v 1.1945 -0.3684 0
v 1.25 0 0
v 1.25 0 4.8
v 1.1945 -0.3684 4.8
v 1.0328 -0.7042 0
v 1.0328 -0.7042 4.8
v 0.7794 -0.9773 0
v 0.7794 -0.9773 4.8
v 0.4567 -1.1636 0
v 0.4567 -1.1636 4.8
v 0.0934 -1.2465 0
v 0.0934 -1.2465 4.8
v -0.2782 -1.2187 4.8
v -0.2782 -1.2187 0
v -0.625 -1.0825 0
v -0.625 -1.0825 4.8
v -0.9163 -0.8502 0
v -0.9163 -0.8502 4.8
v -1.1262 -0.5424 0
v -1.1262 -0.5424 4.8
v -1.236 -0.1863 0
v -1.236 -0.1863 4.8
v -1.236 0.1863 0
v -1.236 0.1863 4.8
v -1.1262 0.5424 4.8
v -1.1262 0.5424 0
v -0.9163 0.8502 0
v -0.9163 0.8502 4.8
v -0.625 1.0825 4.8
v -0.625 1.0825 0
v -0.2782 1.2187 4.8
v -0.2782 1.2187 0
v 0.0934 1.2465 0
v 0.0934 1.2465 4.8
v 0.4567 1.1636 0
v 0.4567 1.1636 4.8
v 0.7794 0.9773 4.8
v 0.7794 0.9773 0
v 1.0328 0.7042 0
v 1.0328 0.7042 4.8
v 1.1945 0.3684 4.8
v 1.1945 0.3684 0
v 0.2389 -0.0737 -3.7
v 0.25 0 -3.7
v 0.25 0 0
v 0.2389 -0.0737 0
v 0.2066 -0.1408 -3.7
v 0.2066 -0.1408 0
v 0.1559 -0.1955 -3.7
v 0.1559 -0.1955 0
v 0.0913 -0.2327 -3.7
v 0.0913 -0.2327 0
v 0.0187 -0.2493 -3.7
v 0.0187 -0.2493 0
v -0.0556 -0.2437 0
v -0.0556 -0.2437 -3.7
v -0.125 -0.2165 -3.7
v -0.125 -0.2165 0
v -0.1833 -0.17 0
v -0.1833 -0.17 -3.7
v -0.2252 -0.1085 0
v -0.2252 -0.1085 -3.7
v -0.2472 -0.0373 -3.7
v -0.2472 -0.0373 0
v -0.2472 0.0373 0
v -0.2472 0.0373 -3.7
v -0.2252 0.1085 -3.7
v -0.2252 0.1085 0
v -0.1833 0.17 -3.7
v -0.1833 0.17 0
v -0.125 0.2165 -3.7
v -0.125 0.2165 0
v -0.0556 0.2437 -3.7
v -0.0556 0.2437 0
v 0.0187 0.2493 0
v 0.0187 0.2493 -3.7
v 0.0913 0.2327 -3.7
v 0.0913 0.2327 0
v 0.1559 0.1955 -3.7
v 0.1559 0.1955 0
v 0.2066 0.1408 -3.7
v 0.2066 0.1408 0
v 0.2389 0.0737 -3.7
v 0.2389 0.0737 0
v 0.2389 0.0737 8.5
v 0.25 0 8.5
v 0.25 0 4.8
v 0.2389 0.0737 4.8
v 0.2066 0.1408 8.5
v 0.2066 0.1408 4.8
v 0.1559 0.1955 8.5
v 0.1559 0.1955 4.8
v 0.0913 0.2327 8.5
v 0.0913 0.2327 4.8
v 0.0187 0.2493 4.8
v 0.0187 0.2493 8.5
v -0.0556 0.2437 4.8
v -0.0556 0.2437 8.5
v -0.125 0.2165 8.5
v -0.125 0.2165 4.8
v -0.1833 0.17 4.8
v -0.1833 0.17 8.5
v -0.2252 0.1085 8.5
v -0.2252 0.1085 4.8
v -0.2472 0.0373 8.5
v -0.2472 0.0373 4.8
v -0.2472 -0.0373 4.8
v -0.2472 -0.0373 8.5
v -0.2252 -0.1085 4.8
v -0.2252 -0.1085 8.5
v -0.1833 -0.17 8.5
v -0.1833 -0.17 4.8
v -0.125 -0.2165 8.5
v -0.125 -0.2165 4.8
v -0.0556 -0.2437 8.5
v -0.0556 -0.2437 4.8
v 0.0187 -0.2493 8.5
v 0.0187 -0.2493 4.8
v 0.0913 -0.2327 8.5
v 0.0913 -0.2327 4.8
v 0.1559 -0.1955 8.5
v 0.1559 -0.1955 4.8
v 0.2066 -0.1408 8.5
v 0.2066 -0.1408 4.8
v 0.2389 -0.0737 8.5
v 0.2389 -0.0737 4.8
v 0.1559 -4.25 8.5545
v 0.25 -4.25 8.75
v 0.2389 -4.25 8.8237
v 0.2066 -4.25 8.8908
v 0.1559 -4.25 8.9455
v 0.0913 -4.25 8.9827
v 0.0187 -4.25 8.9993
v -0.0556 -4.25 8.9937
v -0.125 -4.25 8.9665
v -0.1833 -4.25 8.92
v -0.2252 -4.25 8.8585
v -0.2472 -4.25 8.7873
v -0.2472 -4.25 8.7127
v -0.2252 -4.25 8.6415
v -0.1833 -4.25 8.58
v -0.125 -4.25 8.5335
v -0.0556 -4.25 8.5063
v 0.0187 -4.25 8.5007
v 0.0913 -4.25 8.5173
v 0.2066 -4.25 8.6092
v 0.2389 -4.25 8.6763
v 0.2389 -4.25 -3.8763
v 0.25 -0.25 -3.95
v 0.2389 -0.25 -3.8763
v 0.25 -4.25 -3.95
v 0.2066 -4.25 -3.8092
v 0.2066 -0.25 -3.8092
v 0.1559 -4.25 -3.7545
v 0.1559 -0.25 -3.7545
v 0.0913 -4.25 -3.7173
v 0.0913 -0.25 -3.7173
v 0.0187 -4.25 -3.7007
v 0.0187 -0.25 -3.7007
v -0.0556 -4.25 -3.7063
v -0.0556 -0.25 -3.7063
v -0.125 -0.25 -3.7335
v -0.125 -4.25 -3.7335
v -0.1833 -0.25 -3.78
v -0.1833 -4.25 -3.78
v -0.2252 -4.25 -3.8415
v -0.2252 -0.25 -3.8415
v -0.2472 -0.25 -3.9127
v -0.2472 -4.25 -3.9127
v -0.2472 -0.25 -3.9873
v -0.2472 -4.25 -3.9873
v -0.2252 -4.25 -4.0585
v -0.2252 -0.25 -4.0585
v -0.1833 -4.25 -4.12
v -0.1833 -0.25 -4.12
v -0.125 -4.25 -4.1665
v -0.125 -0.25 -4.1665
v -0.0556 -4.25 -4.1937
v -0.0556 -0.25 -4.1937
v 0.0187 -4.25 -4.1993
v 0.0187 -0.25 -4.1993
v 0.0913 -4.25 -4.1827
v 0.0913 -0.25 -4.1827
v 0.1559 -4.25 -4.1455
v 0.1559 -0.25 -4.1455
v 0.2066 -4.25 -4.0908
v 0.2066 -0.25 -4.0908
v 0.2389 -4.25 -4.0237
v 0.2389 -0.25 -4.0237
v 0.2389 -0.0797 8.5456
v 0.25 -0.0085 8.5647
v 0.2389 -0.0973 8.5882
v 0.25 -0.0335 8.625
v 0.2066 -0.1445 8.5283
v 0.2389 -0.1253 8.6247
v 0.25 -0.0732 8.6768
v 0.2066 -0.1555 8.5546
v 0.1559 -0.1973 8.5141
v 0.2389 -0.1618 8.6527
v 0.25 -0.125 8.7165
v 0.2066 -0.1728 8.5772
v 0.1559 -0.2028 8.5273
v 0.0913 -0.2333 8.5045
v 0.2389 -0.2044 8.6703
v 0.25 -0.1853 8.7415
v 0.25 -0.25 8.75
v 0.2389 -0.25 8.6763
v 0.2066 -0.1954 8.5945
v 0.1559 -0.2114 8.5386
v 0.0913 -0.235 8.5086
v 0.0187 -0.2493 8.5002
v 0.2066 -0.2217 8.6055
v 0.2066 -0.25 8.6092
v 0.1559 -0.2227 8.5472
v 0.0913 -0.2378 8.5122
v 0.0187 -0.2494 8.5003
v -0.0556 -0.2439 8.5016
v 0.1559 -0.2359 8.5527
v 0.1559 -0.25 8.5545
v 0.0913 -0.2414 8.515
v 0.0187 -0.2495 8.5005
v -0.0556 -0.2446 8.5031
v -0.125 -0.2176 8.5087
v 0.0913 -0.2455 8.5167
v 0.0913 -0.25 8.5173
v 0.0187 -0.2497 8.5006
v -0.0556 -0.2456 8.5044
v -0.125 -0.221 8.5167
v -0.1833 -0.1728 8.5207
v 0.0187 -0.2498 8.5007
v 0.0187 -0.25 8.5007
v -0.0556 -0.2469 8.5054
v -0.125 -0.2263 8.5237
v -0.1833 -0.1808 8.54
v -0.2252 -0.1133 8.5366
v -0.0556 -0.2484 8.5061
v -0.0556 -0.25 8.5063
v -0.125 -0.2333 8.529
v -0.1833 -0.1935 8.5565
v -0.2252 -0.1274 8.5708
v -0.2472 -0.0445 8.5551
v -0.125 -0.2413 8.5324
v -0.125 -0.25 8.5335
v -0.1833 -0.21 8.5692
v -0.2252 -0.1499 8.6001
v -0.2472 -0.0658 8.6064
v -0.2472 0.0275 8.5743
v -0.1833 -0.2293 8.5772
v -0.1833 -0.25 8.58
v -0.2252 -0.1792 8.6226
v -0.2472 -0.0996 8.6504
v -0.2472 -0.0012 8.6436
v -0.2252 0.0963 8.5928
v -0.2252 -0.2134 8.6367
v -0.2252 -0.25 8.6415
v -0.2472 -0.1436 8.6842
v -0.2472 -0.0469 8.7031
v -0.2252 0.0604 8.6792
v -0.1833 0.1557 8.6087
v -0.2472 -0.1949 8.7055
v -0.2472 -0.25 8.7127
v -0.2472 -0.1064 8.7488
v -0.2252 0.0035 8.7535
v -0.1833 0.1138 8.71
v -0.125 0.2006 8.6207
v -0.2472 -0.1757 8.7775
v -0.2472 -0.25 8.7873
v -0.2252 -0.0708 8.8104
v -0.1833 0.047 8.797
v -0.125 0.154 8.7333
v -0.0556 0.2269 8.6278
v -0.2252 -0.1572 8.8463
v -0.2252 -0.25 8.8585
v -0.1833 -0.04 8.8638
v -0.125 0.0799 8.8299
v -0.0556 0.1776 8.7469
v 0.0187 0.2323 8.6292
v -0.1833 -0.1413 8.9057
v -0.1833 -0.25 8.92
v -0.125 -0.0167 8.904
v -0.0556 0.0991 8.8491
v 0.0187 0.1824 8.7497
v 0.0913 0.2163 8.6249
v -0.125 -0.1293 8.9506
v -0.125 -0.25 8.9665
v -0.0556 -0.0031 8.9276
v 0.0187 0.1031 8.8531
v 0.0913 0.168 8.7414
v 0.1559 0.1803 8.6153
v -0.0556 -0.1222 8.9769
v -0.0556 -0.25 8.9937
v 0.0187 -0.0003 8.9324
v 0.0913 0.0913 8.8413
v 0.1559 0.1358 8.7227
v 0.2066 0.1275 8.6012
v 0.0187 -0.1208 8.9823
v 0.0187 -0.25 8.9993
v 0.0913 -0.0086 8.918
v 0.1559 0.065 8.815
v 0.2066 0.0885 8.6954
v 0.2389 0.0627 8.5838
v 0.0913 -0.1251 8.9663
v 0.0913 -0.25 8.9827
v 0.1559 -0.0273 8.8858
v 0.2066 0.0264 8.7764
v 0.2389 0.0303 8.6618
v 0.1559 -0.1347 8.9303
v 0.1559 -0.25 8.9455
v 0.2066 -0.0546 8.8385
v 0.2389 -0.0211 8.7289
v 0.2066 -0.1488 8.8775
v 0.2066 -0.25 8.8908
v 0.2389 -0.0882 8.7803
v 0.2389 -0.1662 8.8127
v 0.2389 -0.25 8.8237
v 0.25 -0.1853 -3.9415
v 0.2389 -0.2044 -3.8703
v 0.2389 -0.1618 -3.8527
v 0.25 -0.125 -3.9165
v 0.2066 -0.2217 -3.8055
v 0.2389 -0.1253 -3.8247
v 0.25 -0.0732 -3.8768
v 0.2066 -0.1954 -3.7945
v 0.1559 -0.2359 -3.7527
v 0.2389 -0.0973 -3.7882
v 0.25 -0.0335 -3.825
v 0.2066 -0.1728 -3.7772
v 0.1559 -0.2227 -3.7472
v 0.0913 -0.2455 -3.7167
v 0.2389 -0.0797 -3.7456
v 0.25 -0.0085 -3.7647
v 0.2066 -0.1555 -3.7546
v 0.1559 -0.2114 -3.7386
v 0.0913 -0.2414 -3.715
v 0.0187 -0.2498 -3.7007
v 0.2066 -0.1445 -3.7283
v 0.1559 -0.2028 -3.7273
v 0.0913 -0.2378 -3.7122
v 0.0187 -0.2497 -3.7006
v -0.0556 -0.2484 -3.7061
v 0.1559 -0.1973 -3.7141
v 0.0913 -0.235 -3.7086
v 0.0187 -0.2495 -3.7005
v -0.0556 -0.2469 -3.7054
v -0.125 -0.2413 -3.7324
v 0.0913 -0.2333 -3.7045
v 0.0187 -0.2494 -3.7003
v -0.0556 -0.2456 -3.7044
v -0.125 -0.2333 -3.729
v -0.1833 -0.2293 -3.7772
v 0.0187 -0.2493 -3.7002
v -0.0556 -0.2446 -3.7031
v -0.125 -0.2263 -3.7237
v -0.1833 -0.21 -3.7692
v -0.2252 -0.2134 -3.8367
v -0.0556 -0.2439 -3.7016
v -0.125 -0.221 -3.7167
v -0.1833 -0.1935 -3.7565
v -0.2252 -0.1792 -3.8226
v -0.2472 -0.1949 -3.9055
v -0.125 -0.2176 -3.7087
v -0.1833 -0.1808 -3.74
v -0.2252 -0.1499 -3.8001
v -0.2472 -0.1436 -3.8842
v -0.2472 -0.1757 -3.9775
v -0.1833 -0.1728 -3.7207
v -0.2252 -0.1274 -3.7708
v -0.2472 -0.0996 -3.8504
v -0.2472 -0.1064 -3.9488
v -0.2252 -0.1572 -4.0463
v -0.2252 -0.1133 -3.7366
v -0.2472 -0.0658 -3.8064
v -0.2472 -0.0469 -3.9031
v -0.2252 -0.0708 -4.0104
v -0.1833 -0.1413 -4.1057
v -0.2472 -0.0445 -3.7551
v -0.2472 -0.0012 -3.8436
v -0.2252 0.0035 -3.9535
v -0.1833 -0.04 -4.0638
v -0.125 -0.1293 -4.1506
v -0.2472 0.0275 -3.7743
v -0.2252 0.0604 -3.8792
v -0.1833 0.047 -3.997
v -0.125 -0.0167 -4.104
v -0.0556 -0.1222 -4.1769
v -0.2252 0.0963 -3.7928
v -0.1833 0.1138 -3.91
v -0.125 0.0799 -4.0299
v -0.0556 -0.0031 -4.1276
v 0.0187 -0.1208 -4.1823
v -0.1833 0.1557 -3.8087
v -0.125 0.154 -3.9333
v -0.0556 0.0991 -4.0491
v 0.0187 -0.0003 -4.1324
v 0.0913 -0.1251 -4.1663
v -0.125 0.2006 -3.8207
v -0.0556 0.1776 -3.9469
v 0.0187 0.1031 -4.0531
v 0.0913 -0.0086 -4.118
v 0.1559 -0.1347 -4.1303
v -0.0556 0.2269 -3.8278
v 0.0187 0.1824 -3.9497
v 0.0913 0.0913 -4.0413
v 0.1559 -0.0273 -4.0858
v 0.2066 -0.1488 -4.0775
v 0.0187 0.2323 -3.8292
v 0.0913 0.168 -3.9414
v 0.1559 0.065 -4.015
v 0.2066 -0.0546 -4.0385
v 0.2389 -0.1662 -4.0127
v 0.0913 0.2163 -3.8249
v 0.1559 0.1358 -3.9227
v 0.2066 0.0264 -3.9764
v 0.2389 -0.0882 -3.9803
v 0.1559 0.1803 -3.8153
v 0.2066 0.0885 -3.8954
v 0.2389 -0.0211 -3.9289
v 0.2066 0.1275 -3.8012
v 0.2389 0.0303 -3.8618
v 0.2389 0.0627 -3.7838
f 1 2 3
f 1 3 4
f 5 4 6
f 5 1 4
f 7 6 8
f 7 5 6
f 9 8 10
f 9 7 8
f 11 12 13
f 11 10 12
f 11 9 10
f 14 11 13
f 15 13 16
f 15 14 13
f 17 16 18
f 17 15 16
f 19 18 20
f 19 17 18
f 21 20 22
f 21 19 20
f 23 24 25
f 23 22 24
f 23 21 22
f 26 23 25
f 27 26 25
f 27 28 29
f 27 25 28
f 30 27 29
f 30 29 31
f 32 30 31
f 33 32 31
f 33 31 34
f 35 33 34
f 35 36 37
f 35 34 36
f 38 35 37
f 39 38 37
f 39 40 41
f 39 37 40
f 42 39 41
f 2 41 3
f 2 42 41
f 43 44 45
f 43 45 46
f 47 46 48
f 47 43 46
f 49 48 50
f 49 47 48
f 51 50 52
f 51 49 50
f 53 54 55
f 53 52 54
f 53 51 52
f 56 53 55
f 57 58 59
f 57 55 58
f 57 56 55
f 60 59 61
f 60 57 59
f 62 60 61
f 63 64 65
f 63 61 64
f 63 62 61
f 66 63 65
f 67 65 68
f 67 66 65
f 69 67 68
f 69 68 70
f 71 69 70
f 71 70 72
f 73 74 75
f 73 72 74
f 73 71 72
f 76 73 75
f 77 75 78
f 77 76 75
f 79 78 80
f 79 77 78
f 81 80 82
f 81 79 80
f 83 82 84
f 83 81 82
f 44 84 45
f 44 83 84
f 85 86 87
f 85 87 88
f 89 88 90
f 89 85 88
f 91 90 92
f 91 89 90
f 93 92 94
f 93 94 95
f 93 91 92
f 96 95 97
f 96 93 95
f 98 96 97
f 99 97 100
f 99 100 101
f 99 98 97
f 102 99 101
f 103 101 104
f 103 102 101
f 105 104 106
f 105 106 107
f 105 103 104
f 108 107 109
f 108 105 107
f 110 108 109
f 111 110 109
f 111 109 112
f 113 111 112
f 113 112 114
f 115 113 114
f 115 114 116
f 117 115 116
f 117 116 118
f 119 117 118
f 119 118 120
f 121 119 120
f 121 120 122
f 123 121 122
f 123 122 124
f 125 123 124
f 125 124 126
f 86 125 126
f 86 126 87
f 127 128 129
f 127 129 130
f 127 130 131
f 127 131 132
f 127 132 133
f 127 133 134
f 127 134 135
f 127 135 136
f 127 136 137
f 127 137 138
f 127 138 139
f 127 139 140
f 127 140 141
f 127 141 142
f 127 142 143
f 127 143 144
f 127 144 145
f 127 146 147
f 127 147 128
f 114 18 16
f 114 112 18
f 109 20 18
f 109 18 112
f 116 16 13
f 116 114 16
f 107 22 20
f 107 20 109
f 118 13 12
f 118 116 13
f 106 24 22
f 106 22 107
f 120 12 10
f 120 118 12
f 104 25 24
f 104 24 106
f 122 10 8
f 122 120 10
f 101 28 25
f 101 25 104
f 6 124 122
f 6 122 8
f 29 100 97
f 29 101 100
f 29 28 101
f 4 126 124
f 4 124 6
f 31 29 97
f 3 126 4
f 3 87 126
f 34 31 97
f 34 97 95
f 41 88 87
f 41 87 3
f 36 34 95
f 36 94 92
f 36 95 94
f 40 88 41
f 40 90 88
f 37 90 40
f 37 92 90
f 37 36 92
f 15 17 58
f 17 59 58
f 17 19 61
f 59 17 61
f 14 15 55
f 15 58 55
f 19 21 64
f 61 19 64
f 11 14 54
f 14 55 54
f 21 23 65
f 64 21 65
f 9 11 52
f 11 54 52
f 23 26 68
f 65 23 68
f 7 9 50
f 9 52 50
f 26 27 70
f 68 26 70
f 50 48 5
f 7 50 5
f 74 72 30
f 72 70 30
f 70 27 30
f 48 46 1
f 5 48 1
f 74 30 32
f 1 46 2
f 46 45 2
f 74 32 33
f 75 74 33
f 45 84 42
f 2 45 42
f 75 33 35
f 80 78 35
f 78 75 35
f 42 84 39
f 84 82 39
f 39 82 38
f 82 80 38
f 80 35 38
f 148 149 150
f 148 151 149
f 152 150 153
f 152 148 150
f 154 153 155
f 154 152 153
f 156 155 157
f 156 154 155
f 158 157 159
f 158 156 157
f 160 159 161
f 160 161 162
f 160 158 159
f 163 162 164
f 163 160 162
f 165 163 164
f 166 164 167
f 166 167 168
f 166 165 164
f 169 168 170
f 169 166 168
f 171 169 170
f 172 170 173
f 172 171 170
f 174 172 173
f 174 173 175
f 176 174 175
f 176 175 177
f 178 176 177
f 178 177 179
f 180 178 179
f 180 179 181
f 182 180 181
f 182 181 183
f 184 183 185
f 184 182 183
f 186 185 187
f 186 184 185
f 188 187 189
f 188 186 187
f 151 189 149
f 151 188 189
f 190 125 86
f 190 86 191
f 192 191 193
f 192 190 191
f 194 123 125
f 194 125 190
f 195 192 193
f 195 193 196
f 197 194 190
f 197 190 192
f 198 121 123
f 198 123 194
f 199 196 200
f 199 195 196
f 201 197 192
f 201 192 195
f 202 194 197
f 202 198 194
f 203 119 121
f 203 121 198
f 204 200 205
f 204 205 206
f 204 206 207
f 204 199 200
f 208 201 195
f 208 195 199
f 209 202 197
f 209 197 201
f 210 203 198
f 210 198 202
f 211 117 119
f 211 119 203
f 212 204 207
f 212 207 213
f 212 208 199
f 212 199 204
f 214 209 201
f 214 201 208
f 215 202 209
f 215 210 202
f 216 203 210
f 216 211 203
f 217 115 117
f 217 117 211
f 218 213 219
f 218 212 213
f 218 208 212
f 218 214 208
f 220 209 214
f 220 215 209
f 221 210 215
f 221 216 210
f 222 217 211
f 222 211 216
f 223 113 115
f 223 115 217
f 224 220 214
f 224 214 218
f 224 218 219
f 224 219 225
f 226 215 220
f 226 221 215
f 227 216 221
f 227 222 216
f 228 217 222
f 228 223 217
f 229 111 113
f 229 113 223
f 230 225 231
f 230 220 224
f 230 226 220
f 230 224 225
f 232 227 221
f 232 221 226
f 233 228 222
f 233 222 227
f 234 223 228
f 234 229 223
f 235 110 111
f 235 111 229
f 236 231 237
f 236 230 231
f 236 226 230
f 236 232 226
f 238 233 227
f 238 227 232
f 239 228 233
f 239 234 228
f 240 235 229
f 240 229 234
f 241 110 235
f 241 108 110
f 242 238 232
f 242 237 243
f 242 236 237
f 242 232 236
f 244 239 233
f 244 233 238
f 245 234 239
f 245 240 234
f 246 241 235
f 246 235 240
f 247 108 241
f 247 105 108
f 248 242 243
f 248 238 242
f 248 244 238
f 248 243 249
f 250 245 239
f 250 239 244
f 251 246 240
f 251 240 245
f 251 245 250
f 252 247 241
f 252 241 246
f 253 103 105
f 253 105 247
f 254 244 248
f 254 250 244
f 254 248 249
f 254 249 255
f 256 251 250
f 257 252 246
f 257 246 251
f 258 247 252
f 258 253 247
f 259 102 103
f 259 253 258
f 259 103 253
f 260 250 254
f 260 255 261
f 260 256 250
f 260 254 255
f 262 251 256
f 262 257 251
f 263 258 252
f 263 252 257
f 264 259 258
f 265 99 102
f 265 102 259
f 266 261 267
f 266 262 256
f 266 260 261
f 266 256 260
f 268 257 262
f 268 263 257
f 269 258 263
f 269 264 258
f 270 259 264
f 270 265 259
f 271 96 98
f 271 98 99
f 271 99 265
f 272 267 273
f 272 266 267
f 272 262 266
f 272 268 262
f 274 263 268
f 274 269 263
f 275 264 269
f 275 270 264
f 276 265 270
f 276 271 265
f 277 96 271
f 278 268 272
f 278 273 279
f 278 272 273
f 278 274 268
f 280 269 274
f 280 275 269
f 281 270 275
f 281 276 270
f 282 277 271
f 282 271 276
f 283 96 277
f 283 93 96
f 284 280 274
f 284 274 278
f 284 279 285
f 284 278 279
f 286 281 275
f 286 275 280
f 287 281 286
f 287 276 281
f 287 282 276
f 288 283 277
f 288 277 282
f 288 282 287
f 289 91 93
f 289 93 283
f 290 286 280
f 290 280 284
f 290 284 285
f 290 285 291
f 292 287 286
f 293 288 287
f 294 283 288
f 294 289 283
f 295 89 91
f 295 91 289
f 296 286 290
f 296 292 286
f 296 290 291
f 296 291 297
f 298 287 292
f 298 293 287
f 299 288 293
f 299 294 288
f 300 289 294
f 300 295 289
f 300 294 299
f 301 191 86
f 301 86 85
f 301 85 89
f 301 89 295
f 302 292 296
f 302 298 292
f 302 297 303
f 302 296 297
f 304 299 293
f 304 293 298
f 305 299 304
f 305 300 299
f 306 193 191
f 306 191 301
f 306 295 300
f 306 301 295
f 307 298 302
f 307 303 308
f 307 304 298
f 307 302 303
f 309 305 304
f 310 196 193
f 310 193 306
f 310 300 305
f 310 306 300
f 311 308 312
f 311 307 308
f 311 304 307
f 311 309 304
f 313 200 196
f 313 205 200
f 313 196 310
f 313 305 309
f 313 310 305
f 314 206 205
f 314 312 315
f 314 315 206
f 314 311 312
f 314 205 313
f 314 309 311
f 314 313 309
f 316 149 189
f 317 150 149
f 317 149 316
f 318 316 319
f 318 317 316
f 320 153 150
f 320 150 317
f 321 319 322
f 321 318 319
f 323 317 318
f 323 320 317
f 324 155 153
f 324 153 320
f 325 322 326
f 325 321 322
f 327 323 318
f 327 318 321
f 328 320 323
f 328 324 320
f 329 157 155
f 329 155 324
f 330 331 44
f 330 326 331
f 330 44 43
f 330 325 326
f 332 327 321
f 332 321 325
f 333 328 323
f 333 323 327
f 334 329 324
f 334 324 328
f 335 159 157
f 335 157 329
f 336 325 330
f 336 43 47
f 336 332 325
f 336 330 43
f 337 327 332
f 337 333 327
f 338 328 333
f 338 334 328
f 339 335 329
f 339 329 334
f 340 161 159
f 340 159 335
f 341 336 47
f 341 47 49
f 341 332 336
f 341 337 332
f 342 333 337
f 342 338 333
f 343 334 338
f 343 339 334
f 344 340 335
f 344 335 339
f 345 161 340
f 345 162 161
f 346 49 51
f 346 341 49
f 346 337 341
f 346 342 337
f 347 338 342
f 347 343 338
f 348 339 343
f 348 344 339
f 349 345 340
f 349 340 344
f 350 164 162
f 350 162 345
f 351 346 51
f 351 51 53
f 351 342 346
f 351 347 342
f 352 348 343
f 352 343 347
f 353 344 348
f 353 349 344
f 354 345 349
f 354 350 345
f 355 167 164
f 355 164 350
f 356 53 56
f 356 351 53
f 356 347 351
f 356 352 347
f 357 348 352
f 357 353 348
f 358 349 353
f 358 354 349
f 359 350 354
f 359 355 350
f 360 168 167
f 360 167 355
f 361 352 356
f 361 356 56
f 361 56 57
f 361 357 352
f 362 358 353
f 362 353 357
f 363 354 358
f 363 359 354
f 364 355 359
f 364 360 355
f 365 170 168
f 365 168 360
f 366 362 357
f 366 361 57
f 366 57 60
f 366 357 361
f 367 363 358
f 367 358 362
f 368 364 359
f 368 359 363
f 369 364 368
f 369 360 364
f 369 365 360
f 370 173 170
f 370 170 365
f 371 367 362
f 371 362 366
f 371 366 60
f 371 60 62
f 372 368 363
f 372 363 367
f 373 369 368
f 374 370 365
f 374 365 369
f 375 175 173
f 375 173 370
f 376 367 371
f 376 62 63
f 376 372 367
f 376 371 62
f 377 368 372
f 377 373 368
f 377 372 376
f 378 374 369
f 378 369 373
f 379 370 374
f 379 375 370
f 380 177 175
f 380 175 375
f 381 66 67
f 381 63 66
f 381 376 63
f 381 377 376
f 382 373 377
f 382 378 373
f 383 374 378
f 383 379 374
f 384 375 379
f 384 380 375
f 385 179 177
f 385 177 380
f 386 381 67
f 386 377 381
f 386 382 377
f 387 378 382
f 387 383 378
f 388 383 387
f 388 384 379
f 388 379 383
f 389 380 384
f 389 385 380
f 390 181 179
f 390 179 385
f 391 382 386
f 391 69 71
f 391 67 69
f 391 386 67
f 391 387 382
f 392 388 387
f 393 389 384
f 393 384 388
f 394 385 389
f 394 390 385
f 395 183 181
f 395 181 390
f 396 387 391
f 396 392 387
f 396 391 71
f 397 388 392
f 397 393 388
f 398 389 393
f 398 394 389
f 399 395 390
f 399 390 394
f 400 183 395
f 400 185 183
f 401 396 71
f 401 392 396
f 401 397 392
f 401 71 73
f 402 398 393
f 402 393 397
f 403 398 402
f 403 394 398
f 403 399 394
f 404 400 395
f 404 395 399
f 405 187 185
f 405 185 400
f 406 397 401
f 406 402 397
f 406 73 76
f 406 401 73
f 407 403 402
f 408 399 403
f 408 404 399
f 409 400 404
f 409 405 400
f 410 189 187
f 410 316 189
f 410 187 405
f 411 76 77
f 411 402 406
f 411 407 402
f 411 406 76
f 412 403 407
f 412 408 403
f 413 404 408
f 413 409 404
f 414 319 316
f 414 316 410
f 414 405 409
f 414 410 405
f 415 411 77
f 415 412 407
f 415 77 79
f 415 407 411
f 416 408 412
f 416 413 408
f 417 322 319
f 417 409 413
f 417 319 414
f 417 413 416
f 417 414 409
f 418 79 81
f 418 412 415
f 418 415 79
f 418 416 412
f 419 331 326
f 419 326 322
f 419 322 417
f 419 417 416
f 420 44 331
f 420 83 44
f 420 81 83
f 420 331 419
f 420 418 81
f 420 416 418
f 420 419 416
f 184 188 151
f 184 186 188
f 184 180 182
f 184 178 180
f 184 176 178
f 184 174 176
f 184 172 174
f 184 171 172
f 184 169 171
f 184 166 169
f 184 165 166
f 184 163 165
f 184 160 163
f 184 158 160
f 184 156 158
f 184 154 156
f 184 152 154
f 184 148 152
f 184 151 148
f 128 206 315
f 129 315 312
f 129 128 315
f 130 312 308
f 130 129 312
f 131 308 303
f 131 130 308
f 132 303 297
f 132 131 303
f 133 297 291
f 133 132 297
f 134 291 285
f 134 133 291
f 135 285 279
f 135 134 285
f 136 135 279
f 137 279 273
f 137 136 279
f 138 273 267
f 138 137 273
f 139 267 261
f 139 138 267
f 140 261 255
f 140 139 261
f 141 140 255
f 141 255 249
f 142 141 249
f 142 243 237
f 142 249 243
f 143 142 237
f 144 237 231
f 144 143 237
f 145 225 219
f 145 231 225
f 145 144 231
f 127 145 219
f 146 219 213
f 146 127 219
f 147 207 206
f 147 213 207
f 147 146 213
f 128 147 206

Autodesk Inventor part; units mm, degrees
sketch "Skizze3" plane through (0, 0, 0) normal (0, 0, 1) x (1, 0, 0)
  circle A0 centre (0, 0) radius 1.25
  dimension "d0" = 2.5
extrude "Extrusion1" add sketch "Skizze3" along normal blind 4.8
ref_plane "Arbeitsebene1" through (0, 0, 3.8) normal (0, 0, 1) x (1, 0, 0)
split_face "Trennen1"
ref_plane "Arbeitsebene2" through (0, 0, 0) normal (1, 0, 0) x (0, 1, 0)
sketch "Skizze6" plane through (0, 0, 0) normal (1, 0, 0) x (0, 1, 0)
  line L0 (0, 4.8) -> (0, 8.5)
  arc A0 (0, 8.5) -> (-0.25, 8.75) centre (-0.25, 8.5) ccw
  line L1 (-0.25, 8.5) -> (-0.25, 8.75) construction
  line L2 (-0.25, 8.5) -> (0, 8.5) construction
  line L3 (-0.25, 8.75) -> (-4.25, 8.75)
  line L4 (1.25, 4.8) -> (-1.25, 4.8) projected
  line L5 (1.25, 4.8) -> (1.25, 3.8) projected
  line L6 (1.25, 3.8) -> (1.25, 0) projected
  line L7 (1.25, 0) -> (-1.25, 0) projected
  line L8 (-1.25, 0) -> (-1.25, 3.8) projected
  line L9 (-1.25, 3.8) -> (-1.25, 4.8) projected
  line L10 (-1.25, 4.8) -> (1.25, 4.8) projected
  line L11 (-1.25, 3.8) -> (-1.25, 4.8) projected
  point P0 (0, 0)
  dimension "d7" = 90
  dimension "d9" = 3.7
  dimension "d10" = 4
  dimension "d13" = 0.25
  dimension "d20" = 0.25
  dimension "d21" = 1.25
sketch "Skizze4" plane through (0, 0, 4.8) normal (0, 0, 1) x (1, 0, 0)
  circle A0 centre (0, 0) radius 0.25
  dimension "d4" = 0.5
sweep "Sweeping1" add profiles "Skizze4" path "Skizze6" path curves L0 A0 L3
ref_plane "Arbeitsebene3" through (0, 0, 2.4) normal (0, 0, -1) x (-1, 0, 0)
mirror "Spiegeln1" about plane through (0, 0, 2.4) normal (0, 0, -1) of "Sweeping1"
properties part number "Diode"
